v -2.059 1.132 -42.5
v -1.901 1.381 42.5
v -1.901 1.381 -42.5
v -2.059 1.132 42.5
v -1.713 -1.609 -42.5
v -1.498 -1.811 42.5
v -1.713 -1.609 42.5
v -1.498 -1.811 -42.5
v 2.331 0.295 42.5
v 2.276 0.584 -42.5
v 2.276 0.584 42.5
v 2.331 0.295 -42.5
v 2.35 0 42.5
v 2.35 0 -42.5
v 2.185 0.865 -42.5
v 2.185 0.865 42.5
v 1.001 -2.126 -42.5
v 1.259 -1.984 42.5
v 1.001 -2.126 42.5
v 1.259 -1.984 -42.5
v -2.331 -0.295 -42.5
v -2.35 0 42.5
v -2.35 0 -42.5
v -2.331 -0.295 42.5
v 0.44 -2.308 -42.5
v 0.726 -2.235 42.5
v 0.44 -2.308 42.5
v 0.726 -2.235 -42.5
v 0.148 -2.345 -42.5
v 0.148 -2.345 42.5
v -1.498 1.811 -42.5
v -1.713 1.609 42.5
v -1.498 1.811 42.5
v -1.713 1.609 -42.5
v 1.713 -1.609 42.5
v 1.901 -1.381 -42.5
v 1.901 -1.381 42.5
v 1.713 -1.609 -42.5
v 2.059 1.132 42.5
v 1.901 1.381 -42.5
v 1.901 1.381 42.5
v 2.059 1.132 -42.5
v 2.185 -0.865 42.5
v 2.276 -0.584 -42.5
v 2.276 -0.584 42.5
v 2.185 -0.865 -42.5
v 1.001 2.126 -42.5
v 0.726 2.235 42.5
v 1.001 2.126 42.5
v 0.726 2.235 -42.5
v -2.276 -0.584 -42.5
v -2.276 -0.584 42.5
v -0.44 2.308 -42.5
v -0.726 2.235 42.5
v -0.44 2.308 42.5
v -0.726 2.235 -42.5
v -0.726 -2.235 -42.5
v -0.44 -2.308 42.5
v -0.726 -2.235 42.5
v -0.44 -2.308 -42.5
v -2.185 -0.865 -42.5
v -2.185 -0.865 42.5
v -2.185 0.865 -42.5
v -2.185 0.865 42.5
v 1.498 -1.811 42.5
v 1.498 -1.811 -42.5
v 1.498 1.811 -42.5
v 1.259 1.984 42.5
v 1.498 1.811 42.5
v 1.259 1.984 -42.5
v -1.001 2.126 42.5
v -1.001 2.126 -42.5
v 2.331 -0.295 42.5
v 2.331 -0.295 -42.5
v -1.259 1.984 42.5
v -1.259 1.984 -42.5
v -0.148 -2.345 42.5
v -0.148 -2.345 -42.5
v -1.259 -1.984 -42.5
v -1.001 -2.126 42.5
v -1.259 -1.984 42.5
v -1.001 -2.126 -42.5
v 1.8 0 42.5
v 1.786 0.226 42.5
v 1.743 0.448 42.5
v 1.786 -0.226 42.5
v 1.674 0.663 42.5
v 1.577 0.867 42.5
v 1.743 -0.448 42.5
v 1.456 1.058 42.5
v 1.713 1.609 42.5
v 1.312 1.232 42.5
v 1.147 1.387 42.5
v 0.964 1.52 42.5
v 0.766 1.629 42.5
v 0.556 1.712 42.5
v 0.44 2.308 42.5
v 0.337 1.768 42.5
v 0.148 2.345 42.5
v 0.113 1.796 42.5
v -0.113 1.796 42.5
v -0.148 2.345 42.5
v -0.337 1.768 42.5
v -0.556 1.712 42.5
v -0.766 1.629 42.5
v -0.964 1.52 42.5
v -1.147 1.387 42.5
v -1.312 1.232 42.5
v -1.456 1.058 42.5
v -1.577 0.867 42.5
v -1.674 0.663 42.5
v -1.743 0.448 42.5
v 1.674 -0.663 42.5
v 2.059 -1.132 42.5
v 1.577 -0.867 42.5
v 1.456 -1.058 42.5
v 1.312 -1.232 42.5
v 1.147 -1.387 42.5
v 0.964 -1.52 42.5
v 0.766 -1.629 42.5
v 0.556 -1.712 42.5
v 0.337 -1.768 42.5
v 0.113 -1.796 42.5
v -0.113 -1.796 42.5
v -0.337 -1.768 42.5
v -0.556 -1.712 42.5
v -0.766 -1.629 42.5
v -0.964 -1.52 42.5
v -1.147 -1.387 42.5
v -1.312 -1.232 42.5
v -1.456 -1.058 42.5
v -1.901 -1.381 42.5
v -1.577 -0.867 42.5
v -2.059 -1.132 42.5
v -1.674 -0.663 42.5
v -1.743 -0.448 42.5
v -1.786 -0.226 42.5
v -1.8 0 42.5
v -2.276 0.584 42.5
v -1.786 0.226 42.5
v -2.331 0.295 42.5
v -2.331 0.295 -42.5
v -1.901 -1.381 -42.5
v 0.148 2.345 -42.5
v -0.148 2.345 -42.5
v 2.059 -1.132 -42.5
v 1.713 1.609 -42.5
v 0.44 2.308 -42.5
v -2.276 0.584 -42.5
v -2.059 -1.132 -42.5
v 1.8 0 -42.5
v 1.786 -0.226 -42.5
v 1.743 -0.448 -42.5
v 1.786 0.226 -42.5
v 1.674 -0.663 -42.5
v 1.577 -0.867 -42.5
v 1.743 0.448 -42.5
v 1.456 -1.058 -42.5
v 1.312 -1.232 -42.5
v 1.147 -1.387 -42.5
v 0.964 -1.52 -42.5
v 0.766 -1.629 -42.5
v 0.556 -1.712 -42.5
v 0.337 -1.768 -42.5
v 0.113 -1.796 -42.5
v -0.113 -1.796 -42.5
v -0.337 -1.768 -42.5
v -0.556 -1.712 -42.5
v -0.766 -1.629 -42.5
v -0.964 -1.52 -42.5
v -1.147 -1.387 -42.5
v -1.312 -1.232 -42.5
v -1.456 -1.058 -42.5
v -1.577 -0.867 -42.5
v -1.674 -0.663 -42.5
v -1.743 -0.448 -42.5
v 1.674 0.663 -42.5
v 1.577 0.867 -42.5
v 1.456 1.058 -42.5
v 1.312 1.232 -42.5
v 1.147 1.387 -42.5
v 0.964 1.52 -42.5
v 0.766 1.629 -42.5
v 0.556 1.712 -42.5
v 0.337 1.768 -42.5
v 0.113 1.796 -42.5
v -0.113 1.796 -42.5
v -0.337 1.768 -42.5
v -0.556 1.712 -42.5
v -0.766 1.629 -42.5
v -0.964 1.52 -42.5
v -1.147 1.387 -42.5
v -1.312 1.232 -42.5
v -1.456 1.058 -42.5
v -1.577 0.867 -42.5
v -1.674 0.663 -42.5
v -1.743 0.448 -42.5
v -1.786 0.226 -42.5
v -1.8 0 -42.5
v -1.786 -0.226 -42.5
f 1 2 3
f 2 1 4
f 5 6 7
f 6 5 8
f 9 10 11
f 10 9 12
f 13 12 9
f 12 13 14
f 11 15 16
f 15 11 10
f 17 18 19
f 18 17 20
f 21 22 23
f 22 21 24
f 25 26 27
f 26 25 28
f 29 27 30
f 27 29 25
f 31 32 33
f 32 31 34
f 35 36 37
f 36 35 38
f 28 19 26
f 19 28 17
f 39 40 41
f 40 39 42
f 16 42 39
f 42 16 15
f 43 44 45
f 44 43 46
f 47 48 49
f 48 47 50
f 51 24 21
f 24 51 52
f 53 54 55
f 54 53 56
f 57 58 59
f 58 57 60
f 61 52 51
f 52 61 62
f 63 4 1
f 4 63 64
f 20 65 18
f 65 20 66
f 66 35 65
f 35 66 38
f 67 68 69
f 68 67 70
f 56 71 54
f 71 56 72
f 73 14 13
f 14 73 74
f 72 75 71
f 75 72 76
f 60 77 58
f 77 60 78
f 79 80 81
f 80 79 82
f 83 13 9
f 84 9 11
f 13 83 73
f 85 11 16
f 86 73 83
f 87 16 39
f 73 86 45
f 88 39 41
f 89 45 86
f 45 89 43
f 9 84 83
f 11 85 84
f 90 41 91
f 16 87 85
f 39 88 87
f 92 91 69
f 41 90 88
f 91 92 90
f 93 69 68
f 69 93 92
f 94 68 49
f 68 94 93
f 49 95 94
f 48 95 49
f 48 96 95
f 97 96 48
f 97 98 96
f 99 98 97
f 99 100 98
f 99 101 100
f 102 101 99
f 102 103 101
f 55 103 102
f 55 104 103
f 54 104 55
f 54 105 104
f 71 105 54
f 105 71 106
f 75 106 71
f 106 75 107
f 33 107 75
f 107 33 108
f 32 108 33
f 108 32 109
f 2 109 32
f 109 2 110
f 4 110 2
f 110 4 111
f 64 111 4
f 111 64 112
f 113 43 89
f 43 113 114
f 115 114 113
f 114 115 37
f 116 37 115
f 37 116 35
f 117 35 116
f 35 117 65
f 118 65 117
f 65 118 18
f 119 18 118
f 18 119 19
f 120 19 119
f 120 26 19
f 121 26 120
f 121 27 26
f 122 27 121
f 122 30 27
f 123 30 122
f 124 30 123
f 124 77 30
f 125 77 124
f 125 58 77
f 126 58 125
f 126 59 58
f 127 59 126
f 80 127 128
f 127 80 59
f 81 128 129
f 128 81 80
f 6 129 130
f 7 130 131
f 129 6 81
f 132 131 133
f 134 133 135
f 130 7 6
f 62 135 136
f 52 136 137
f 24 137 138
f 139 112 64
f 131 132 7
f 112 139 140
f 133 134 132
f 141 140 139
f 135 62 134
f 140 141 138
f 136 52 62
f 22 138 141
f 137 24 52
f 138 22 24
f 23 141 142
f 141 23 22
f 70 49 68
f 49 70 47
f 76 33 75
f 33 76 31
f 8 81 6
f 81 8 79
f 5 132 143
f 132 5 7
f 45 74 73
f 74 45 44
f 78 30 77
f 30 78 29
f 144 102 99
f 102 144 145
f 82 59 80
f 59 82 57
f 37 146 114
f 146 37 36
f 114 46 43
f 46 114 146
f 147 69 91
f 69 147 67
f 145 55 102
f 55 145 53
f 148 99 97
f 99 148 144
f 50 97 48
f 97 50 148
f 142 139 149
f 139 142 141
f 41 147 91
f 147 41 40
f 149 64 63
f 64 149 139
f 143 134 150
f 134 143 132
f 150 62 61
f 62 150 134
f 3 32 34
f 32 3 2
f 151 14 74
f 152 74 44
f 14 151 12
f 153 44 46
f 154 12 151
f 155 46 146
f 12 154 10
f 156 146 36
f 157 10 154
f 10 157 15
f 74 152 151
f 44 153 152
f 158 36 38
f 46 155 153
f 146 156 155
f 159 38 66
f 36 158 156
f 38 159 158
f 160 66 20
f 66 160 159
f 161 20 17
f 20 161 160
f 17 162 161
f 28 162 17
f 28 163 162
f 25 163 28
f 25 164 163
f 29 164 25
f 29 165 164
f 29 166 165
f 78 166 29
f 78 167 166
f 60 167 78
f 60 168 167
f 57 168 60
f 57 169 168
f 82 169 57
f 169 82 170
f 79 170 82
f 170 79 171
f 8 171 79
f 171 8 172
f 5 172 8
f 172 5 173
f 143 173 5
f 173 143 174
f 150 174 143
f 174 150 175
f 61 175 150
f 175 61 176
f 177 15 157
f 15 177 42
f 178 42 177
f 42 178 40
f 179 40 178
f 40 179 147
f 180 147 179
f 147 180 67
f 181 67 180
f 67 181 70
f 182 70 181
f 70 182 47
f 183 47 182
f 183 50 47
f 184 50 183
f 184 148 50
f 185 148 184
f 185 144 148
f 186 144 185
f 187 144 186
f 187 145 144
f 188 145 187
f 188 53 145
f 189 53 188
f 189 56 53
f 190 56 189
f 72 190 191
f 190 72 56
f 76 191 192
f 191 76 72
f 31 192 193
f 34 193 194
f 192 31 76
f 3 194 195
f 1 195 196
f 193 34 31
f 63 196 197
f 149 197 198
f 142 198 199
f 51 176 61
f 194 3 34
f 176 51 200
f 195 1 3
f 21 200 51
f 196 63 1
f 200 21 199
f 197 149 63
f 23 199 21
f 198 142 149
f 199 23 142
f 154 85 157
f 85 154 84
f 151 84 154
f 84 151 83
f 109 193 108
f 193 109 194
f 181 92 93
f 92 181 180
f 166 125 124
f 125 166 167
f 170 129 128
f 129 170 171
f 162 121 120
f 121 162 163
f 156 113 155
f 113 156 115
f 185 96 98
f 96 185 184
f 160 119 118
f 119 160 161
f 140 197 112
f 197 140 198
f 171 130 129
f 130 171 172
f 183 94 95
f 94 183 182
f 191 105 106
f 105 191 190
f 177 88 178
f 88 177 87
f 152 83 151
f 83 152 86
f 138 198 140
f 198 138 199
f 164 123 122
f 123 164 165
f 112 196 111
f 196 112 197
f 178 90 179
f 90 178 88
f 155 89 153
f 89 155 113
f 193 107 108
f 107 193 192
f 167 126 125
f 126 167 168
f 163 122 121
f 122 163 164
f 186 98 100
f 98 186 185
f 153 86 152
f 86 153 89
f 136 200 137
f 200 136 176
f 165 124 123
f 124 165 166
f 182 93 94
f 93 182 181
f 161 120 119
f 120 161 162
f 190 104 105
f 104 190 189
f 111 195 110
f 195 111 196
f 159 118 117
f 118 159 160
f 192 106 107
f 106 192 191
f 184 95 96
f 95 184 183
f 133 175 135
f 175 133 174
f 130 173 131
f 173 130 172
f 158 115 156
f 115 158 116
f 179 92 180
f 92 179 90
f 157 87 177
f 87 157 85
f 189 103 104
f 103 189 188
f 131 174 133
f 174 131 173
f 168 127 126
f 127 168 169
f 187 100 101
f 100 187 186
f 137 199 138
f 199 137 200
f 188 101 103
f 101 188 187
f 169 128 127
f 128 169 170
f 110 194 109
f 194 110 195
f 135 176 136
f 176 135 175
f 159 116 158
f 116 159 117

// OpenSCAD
$fn = 50;


difference() {
	union() {
		translate(v = [0, 0, -42.5000000000]) {
			cylinder(h = 85, r = 2.3500000000);
		}
	}
	union() {
		#translate(v = [0, 0, -100.0000000000]) {
			cylinder(h = 200, r = 1.8000000000);
		}
	}
}
